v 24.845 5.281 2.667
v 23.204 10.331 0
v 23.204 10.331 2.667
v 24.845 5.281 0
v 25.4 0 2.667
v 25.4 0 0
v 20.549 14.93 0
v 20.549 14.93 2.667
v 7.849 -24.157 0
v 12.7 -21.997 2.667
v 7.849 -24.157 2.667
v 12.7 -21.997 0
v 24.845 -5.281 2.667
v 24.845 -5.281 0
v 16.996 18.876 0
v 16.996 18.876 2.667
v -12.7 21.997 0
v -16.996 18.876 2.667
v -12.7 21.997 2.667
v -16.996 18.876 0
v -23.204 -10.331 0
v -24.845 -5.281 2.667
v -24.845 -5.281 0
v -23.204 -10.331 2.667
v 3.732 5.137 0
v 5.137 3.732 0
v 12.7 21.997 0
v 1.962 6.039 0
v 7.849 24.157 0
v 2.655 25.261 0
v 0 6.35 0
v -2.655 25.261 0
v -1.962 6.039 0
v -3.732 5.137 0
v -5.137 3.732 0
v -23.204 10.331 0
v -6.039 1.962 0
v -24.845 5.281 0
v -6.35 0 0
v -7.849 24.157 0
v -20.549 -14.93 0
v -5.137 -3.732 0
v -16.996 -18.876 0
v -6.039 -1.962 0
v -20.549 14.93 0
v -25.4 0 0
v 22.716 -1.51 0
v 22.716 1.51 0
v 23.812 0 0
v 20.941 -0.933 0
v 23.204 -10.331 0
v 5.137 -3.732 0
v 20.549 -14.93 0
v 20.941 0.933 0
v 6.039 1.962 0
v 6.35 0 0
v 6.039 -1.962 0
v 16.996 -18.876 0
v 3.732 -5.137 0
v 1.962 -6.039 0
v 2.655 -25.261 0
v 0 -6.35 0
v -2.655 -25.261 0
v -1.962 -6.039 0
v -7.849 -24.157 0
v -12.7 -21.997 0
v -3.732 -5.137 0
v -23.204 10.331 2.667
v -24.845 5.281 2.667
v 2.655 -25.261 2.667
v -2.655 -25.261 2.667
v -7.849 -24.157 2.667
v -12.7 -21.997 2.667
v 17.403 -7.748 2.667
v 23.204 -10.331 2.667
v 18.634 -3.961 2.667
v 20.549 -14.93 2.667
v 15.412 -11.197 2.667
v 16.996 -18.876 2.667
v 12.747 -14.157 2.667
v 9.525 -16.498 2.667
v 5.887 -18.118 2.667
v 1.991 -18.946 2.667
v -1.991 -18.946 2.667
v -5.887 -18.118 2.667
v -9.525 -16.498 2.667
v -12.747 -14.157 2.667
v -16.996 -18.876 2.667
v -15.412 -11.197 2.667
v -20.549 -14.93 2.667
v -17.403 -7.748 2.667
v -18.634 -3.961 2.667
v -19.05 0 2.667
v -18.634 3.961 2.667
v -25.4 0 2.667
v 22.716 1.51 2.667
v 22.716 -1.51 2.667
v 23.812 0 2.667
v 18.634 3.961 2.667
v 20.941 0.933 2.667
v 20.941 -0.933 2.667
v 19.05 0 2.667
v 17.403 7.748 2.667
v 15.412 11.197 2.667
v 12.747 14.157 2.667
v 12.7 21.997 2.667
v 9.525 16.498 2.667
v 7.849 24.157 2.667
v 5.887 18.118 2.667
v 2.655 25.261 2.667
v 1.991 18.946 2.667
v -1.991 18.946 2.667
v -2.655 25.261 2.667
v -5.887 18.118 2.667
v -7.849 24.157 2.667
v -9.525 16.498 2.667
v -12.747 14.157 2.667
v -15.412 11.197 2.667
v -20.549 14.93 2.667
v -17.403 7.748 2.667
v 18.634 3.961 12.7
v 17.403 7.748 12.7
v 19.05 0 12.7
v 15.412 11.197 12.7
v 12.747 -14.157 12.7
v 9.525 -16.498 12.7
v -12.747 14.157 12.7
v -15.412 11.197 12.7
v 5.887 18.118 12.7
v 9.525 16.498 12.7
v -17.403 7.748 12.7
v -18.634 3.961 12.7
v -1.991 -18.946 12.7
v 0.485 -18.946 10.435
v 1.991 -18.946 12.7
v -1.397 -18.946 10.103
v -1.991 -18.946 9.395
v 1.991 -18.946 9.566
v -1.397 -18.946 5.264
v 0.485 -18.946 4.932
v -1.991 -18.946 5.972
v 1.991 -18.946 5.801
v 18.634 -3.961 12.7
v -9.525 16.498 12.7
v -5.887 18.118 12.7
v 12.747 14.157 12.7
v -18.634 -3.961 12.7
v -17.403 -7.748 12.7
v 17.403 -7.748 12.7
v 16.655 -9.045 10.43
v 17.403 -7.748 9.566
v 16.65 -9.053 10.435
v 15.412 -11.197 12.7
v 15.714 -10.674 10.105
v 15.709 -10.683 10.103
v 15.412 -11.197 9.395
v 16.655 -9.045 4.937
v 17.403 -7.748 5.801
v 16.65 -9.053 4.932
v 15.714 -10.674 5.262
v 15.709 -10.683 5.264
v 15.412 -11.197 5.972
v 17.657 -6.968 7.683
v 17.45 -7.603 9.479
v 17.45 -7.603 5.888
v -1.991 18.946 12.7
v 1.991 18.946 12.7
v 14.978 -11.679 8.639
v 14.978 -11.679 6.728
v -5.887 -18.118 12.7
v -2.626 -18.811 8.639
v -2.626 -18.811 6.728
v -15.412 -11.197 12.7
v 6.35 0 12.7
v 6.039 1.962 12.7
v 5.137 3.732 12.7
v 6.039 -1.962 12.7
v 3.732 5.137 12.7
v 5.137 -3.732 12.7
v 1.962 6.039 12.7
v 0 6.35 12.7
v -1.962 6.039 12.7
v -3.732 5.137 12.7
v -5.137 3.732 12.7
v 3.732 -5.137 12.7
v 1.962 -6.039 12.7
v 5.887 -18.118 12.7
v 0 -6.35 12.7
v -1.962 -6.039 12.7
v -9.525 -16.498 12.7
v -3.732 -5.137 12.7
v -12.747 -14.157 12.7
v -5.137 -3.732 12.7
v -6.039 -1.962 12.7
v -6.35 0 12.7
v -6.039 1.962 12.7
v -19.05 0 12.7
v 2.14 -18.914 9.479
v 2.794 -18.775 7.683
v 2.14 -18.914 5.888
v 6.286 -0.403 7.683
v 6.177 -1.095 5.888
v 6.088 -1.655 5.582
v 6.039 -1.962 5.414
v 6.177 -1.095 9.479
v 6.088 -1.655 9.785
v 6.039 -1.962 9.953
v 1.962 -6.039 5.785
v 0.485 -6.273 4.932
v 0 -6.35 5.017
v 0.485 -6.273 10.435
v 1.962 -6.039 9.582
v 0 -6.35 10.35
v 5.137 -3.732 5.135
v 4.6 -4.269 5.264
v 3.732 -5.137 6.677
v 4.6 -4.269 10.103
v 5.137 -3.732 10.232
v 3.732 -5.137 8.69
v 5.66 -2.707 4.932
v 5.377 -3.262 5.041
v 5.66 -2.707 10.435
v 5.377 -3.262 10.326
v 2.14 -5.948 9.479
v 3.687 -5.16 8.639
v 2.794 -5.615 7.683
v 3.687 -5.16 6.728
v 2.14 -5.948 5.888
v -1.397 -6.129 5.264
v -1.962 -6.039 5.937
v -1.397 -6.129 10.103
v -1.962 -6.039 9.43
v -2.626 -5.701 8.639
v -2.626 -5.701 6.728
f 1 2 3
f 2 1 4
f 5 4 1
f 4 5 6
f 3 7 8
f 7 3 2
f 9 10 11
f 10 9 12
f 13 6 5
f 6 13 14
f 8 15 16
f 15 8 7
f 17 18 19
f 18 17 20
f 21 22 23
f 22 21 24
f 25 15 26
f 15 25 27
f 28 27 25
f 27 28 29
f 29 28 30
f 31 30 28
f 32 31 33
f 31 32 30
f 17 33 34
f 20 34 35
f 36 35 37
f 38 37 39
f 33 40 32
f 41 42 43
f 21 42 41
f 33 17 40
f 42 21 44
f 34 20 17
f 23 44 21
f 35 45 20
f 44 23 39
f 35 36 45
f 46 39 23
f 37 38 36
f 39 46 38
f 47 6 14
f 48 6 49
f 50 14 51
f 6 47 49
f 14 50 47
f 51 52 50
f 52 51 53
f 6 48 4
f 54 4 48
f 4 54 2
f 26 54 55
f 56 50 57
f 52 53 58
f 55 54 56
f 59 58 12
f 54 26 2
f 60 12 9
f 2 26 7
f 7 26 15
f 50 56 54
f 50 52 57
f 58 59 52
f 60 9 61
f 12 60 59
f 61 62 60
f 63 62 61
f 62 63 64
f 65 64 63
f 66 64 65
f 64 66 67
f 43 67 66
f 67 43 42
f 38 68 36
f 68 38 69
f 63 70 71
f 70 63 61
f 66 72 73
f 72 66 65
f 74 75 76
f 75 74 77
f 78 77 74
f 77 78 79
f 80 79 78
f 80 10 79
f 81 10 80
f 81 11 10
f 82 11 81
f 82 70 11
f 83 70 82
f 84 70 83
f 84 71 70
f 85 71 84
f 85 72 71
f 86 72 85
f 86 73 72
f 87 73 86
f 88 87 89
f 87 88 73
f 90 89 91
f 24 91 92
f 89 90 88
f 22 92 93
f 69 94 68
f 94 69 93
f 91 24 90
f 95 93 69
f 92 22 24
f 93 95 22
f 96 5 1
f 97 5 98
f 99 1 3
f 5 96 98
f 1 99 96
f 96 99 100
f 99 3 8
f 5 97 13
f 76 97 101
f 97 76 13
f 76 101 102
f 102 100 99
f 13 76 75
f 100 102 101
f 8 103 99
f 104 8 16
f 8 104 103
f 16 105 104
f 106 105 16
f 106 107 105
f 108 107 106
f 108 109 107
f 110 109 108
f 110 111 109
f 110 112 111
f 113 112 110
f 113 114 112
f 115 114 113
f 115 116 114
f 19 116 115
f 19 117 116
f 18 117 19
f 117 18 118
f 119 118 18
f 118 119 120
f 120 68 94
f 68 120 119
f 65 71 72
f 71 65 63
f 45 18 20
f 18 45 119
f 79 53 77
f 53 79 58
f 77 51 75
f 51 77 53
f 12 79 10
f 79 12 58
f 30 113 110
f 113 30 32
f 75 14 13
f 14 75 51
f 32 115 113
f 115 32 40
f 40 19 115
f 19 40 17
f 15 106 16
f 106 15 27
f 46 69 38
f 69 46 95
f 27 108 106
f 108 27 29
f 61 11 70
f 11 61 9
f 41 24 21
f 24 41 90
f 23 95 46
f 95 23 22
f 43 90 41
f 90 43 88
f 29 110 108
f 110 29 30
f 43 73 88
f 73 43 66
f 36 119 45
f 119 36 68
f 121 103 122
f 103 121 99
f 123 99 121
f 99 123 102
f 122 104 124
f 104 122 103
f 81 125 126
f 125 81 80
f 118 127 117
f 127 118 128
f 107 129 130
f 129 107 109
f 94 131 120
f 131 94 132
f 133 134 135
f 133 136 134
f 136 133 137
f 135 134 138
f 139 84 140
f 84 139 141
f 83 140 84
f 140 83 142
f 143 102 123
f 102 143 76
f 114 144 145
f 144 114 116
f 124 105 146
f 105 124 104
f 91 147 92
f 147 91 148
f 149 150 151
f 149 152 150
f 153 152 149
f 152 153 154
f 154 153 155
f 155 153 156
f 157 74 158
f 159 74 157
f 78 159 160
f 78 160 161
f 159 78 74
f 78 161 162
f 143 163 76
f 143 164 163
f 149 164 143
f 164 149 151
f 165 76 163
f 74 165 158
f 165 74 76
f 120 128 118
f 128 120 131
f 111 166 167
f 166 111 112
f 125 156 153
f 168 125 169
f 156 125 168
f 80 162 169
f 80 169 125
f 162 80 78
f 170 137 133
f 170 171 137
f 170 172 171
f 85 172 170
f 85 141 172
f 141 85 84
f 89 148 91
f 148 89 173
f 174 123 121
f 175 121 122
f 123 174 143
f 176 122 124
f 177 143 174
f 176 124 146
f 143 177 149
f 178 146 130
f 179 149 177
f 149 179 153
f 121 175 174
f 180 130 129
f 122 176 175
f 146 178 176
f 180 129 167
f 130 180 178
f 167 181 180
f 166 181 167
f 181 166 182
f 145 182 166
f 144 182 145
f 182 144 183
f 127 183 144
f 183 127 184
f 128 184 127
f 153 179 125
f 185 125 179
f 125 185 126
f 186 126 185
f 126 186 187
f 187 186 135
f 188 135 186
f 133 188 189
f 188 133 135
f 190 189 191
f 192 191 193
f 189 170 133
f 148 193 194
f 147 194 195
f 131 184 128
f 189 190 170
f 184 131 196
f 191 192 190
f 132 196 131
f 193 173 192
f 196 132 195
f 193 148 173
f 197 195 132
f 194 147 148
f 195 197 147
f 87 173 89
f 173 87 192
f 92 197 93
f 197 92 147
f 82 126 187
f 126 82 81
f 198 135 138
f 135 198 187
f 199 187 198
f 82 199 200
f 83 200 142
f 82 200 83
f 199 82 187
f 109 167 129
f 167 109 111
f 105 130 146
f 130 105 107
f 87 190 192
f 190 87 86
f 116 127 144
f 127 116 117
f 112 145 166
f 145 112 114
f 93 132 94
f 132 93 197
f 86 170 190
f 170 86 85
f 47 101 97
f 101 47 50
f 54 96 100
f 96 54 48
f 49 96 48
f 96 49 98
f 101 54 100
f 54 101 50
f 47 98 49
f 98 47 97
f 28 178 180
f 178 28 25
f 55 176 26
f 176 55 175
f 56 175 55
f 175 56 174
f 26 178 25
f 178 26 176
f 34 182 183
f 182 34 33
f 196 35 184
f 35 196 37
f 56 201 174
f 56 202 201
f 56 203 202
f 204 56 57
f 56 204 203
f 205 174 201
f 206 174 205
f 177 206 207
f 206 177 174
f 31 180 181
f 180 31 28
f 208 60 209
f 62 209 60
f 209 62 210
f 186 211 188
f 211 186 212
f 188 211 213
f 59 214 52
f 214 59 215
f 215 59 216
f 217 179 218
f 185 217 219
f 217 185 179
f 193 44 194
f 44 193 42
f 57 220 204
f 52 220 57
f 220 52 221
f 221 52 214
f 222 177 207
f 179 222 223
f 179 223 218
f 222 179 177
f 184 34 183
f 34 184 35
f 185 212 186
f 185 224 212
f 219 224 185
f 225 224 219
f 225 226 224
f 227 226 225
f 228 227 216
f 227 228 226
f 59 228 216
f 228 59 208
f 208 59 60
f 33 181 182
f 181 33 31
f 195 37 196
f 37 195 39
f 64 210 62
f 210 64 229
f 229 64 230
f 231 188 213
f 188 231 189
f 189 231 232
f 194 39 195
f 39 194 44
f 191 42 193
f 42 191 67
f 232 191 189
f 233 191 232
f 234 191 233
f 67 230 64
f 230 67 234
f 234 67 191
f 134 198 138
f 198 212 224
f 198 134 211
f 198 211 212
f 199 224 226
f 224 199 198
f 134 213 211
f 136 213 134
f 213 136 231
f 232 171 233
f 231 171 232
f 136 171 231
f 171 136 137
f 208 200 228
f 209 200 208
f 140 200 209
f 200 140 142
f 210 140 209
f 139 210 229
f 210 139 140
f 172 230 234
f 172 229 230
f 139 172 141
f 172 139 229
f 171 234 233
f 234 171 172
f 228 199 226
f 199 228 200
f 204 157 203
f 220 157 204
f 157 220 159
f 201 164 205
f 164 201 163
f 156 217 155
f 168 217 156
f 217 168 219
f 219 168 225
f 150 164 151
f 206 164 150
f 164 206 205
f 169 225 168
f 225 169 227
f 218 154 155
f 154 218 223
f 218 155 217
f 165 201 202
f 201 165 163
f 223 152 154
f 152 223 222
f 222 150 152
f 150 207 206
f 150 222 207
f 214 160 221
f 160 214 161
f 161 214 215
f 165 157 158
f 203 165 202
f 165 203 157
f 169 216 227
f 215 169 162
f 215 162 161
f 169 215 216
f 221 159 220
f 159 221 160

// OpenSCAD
function mm(i) = i*25.4 ;
thickness = mm(.5);
width = mm(1.5);




module base()
{
	union()
	{
		cylinder(mm(.105),mm(2)/2, mm(2)/2, 0);
		cylinder(thickness,width/2,width/2,0);
		
	}
		
}


module centerHole()
{
	cylinder(mm(thickness+mm(1)),mm(.5)/2, mm(.5)/2, 0);
}


module sideHole()
{
		{rotate([90, 0, 0]) {
		cylinder(mm(.75),mm(.22)/2,mm(.22)/2,0);
		}
	}
}


module toothgap()

{
union(){
	translate([mm(7/8),0,0])	{
		cylinder(mm(.2),mm(1/8)/2,mm(1/8)/2,0);
		}	
	translate([mm(7.4/8),0,0]) {
		rotate([0,0,90]){
			polyhedron( 
      	   points = [ 
              [-3, -2, 4], 
              [3, -2, 4], 
              [0, 2, 4], 
              [-3, -2, -1], 
              [3, -2, -1], 
              [0, 2, -1]
        	 ],
        	 triangles = [
              [0, 1, 2],
              [3, 4, 5],
              [0, 1, 4, 3],
              [0, 2, 5, 3],
              [1, 2, 5, 4]
         ]
    );
			}
		}
	}
}


module sprocket()
{
	difference(){
		base();
		translate([0,0,mm(-.5)]) {
			centerHole();
			}
		translate([0,0,(thickness/2+mm(.105)/2)]) {
			sideHole();
			}
		{rotate([0, 0, 60]) {
		translate([0,0,(thickness/2+mm(.105)/2)]) {
			sideHole();
				}
			}
		}
		toothgap();


	}
}


sprocket();
